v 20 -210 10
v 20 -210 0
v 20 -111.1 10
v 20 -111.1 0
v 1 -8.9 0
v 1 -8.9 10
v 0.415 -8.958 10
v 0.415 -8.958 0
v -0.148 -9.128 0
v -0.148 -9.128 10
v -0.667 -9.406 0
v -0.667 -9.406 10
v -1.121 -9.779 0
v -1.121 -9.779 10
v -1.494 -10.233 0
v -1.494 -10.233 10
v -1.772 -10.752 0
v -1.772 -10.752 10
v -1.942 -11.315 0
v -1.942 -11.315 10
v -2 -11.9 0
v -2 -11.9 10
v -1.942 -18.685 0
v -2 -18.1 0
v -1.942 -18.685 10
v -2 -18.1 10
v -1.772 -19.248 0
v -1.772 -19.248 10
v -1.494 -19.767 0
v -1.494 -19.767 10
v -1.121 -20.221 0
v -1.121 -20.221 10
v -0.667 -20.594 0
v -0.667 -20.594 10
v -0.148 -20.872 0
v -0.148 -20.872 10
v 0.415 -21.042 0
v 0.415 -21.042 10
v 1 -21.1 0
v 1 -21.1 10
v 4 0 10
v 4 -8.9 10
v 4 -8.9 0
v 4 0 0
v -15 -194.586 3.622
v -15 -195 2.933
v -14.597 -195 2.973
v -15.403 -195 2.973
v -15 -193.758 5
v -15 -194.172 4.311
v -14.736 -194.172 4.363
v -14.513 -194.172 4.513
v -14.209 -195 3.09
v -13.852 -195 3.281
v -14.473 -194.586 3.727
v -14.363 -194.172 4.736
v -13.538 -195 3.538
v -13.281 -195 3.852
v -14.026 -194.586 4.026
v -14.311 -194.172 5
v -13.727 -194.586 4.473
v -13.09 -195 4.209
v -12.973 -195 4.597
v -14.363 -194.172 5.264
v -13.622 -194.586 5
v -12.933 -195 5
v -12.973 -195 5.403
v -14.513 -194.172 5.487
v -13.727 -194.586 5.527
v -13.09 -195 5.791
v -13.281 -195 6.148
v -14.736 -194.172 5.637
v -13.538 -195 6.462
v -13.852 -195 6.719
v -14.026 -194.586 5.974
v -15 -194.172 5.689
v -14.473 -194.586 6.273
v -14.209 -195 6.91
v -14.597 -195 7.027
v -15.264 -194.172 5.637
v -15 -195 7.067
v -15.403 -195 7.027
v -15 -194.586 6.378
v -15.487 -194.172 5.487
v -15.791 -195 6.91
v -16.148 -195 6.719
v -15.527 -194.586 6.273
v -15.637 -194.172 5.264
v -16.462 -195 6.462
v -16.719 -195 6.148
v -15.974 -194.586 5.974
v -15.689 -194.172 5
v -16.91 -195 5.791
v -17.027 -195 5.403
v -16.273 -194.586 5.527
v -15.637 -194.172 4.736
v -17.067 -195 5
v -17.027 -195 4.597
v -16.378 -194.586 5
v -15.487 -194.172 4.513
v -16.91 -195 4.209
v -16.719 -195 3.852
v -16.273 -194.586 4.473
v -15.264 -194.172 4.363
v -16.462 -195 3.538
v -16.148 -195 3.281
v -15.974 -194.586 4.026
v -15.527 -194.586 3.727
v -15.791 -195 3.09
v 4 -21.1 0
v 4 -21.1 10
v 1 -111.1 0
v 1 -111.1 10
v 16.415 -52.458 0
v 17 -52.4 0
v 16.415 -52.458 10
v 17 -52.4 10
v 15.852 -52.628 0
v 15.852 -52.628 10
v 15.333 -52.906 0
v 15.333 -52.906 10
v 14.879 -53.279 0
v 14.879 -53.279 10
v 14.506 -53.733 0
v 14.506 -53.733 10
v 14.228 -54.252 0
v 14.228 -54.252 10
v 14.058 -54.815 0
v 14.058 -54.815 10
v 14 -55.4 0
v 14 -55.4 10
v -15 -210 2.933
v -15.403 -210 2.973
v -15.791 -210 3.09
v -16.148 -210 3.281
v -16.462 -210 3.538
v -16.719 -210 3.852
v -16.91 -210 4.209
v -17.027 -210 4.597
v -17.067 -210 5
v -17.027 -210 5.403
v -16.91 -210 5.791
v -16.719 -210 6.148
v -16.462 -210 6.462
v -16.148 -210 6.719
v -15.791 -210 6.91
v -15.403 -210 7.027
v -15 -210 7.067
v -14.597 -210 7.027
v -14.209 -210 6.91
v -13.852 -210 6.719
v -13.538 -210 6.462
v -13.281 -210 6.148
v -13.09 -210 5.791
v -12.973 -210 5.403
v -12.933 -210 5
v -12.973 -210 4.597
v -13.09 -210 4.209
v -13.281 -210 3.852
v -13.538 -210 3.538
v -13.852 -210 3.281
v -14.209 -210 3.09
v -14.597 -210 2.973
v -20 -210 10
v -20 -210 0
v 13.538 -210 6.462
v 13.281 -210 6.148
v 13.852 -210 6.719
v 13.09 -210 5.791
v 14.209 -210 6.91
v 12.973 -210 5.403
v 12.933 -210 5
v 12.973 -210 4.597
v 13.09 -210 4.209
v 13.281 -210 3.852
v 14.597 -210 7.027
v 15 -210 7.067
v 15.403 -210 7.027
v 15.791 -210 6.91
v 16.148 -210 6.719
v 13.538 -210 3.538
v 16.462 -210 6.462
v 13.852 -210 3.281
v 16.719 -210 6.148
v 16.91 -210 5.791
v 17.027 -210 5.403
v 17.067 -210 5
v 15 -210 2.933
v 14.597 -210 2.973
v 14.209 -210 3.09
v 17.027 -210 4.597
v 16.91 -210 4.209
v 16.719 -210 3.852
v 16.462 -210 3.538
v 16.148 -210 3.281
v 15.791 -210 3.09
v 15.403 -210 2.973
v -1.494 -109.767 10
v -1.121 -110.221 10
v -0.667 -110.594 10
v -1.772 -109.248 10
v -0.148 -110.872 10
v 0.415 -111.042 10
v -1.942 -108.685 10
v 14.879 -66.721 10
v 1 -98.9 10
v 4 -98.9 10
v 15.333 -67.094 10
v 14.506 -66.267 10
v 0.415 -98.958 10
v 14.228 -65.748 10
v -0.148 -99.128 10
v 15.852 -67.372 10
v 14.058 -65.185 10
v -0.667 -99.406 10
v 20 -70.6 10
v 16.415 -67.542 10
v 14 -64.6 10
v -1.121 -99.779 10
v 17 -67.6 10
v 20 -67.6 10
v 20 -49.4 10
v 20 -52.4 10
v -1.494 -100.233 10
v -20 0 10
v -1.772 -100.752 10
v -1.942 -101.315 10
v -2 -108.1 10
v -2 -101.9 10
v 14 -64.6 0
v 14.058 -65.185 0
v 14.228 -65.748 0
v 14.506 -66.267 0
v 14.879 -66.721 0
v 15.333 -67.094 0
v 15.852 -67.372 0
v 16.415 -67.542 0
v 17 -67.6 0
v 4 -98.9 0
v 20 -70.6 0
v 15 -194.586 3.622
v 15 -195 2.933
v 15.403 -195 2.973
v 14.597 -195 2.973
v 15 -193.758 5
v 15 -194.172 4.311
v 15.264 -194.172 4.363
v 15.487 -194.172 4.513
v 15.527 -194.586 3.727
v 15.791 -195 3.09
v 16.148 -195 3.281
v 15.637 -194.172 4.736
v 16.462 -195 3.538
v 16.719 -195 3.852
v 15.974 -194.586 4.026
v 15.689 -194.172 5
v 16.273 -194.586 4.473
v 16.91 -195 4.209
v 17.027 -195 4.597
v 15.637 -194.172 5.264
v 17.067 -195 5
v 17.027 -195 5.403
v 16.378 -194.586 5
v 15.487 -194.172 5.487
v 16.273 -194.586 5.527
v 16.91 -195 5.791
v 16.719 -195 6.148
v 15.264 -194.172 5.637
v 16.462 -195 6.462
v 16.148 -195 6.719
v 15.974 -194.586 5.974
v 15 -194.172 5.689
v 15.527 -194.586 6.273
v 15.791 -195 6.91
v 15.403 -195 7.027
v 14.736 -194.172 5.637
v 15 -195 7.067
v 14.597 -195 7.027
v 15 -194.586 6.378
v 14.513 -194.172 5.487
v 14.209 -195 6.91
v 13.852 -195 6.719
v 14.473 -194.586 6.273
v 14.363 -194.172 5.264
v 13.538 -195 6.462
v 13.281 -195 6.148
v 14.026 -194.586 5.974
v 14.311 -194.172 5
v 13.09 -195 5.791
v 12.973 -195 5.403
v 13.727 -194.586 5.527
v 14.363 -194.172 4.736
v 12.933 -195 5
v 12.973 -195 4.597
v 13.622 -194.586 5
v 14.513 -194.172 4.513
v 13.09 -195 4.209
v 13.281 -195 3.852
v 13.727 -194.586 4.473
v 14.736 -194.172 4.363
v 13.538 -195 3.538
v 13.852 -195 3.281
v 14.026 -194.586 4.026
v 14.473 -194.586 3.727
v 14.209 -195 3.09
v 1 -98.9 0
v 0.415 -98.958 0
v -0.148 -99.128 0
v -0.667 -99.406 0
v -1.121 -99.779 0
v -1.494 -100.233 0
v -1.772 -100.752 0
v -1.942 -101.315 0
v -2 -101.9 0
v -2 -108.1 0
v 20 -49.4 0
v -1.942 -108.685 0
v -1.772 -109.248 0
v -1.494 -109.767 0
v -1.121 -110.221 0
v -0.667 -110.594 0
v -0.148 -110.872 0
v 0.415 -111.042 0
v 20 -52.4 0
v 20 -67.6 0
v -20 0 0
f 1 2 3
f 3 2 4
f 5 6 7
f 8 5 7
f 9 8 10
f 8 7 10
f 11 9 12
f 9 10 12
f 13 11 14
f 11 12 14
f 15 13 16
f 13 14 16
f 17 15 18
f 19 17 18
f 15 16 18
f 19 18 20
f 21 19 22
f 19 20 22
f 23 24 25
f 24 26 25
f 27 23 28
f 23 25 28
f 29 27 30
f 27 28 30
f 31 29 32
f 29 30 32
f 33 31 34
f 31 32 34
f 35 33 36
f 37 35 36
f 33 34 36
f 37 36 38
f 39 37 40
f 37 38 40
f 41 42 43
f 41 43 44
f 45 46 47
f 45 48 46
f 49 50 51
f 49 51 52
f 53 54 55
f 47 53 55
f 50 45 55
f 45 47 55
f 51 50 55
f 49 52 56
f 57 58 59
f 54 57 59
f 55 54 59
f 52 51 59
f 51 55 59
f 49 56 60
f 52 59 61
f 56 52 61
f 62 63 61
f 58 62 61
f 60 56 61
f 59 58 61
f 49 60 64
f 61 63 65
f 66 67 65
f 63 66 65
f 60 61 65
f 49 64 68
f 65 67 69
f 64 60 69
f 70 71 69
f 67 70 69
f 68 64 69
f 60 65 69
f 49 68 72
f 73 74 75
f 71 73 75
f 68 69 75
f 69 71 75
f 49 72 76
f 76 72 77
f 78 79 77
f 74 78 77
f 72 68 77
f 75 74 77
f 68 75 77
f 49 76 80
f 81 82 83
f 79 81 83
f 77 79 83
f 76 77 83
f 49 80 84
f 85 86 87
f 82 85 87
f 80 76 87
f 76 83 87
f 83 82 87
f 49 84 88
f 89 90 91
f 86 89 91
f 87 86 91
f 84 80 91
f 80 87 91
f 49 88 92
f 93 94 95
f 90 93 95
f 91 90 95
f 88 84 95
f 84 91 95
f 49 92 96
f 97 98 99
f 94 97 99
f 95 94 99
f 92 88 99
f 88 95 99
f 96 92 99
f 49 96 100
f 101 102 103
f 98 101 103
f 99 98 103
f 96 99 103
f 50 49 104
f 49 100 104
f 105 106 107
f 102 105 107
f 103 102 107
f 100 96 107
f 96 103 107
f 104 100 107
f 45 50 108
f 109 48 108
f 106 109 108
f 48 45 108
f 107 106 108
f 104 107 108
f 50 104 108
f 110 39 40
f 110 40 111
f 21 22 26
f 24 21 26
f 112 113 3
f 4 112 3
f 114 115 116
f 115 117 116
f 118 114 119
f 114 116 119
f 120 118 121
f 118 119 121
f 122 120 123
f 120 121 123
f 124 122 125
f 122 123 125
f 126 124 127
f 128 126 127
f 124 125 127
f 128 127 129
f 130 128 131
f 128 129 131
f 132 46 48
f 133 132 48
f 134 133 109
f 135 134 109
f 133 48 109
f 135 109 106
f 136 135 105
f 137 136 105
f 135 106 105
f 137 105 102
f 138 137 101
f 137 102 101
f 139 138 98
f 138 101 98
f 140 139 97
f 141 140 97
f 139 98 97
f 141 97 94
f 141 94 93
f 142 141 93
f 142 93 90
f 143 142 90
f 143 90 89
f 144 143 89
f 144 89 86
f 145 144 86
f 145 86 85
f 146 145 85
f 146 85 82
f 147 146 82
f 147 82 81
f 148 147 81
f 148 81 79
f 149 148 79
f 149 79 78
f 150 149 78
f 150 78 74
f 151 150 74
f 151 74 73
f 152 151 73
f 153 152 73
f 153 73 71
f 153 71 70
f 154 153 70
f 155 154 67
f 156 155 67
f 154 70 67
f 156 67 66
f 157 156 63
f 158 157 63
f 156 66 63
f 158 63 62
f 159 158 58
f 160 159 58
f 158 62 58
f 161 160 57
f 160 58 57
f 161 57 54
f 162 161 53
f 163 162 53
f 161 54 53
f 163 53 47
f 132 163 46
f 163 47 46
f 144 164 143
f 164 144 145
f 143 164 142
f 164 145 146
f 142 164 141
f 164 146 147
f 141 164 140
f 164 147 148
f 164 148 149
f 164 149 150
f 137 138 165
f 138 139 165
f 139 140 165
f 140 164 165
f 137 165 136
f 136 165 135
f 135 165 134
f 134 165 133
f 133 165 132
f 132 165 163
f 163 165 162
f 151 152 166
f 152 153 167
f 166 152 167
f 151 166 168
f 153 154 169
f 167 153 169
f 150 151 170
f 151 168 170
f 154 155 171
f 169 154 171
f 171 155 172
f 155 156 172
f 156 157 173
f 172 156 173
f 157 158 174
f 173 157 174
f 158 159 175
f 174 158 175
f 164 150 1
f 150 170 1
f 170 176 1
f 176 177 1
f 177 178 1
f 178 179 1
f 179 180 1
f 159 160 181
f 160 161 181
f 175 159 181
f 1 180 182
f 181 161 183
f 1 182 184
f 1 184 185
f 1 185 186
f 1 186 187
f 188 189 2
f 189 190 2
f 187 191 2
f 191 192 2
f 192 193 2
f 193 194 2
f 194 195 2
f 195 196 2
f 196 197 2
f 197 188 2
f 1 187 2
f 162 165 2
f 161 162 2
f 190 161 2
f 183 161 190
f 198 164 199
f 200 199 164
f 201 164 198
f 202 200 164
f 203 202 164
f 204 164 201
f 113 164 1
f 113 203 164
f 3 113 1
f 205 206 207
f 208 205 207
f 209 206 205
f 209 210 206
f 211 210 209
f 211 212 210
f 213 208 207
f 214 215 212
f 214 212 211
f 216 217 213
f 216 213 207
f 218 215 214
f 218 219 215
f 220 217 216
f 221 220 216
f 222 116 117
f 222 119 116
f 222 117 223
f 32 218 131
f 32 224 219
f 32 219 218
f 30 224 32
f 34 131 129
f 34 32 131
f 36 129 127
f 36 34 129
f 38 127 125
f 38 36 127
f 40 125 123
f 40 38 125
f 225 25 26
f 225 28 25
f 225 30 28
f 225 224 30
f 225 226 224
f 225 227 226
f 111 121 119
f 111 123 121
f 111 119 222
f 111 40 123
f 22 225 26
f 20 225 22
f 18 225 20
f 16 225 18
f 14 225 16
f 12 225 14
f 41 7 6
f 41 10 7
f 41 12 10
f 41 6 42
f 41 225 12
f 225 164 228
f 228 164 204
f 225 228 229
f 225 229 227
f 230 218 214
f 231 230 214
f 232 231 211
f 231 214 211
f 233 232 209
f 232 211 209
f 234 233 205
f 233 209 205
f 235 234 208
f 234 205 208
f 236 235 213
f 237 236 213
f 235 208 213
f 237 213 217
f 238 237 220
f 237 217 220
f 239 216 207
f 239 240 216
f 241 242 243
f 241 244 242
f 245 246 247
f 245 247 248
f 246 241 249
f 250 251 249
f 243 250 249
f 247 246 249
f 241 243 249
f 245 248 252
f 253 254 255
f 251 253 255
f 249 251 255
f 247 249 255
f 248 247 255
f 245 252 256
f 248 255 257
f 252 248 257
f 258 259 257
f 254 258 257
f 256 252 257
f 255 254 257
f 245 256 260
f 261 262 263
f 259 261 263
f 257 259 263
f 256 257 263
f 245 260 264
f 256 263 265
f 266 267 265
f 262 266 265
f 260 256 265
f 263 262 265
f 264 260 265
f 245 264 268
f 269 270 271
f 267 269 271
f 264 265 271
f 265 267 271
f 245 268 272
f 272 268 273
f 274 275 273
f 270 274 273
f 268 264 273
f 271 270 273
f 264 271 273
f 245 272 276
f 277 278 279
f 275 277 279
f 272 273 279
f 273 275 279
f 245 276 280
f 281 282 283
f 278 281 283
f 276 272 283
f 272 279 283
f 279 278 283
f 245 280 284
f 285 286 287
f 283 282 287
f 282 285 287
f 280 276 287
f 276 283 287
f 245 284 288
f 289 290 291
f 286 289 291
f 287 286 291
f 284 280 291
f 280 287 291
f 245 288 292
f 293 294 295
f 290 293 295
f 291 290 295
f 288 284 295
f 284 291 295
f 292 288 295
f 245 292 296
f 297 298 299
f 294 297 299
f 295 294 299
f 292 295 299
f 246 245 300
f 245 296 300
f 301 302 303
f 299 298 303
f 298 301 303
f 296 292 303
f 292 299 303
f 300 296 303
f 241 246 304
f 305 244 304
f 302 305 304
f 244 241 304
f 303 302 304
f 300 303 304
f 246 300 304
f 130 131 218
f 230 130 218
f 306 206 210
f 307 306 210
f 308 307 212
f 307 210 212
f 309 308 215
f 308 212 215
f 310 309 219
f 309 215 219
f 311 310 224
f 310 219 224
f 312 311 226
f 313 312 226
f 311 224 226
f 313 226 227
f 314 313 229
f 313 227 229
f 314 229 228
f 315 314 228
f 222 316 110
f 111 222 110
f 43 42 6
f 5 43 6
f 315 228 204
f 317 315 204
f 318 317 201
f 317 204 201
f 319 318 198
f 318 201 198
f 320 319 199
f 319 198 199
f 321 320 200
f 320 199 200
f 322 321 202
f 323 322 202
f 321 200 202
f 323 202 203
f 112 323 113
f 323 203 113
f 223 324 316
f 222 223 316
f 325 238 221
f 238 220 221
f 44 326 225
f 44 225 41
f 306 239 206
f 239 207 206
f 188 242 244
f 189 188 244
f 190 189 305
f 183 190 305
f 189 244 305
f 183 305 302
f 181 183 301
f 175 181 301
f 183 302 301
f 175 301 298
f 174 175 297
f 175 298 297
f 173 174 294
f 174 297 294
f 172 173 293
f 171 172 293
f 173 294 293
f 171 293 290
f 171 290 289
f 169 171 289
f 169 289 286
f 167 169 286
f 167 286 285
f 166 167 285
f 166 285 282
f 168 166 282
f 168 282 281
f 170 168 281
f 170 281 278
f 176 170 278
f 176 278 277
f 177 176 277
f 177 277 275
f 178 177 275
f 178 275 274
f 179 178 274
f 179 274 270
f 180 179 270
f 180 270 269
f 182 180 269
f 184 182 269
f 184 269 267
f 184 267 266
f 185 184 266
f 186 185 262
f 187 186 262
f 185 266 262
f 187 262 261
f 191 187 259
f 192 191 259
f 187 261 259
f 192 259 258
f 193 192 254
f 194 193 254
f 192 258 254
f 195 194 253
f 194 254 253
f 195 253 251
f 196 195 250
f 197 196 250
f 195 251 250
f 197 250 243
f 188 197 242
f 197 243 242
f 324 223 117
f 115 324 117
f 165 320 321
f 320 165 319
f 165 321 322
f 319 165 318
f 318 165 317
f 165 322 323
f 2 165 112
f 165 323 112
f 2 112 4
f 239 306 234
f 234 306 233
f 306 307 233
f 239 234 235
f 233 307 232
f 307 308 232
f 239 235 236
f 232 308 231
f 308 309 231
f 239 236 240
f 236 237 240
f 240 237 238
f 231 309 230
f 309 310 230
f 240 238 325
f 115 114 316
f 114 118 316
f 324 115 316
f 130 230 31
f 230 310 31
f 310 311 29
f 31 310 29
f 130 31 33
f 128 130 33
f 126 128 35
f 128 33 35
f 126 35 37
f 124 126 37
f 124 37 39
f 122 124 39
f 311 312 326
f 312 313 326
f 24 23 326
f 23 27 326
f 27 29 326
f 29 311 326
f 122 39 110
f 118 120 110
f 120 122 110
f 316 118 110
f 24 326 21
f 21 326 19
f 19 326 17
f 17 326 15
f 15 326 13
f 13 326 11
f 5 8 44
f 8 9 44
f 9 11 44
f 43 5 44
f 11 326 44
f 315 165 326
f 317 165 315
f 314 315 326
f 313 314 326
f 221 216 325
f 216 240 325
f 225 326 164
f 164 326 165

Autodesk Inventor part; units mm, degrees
ref_plane "YZ Plane" through (0, 0, 0) normal (1, 0, 0) x (0, 1, 0)
ref_plane "XZ Plane" through (0, 0, 0) normal (0, 1, 0) x (-1, 0, 0)
ref_plane "XY Plane" through (0, 0, 0) normal (0, 0, 1) x (1, 0, 0)
sketch "Skizze1" plane through (0, 0, 0) normal (0, 0, 1) x (1, 0, 0)
  line L0 (0, 42) -> (0, -252) projected
  line L1 (-28, 0) -> (28, 0) projected
  line L2 (20, 0) -> (-20, 0)
  line L3 (-20, 0) -> (-20, -210)
  line L4 (-20, -210) -> (20, -210)
  line L5 (20, -210) -> (20, 0)
  point P0 (0, 0)
  point P1 (0, -210)
  dimension "d0" = 210
  dimension "d1" = 40
extrude "Extrusion1" add sketch "Skizze1" along normal blind 10
sketch "Skizze2" plane through (0, 0, 10) normal (0, 0, 1) x (1, 0, 0)
  line L0 (20, 0) -> (20, -210) projected
  line L1 (-20, 0) -> (20, 0) projected
  line L2 (20, -8.9) -> (1, -8.9)
  line L3 (-2, -11.9) -> (-2, -18.1)
  line L4 (1, -21.1) -> (20, -21.1)
  line L5 (20, -21.1) -> (20, -8.9)
  arc A0 (1, -8.9) -> (-2, -11.9) centre (1, -11.9) ccw
  arc A1 (-2, -18.1) -> (1, -21.1) centre (1, -18.1) ccw
  line L6 (1, -12) -> (1, -18) construction
  line L7 (20, -52.4) -> (17, -52.4)
  line L8 (14, -55.4) -> (14, -64.6)
  line L9 (17, -67.6) -> (20, -67.6)
  line L10 (20, -67.6) -> (20, -52.4)
  arc A2 (17, -52.4) -> (14, -55.4) centre (17, -55.4) ccw
  arc A3 (14, -64.6) -> (17, -67.6) centre (17, -64.6) ccw
  line L11 (17, -55.5) -> (17, -64.5) construction
  line L12 (20, -98.9) -> (1, -98.9)
  line L13 (-2, -101.9) -> (-2, -108.1)
  line L14 (1, -111.1) -> (20, -111.1)
  line L15 (20, -111.1) -> (20, -98.9)
  arc A4 (1, -98.9) -> (-2, -101.9) centre (1, -101.9) ccw
  arc A5 (-2, -108.1) -> (1, -111.1) centre (1, -108.1) ccw
  line L16 (1, -102) -> (1, -108) construction
  point P0 (0, 0)
  dimension "d4" = 22
  dimension "d5" = 12.2
  dimension "d6" = 3
  dimension "d7" = 6
  dimension "d8" = 0.1
  dimension "d9" = 12
  dimension "d10" = 6
  dimension "d11" = 15.2
  dimension "d12" = 3
  dimension "d13" = 9
  dimension "d14" = 0.1
  dimension "d15" = 55.5
  dimension "d16" = 12.2
  dimension "d17" = 22
  dimension "d18" = 3
  dimension "d19" = 6
  dimension "d20" = 0.1
  dimension "d21" = 102
extrude "Extrusion2" cut sketch "Skizze2" against normal through all
sketch "Skizze3" plane through (0, 0, 0) normal (0, 0, -1) x (-1, 0, 0)
  line L0 (-20, -98.9) -> (-1, -98.9) projected
  line L1 (-20, 0) -> (20, 0) projected
  line L2 (-20, -8.9) -> (-20, 0) projected
  line L3 (-20, -8.9) -> (-1, -8.9) projected
  line L4 (-1, -21.1) -> (-20, -21.1) projected
  line L5 (-20, -52.4) -> (-20, -21.1) projected
  line L6 (-20, -52.4) -> (-17, -52.4) projected
  line L7 (-17, -67.6) -> (-20, -67.6) projected
  line L8 (-20, -98.9) -> (-20, -67.6) projected
  line L9 (-20, -49.4) -> (-4, -21.1)
  line L10 (-4, -8.9) -> (-4, 0)
  line L11 (-20, -70.6) -> (-4, -98.9)
  point P0 (0, 0)
  dimension "d24" = 3
  dimension "d25" = 3
  dimension "d26" = 16
  dimension "d27" = 3
  dimension "d28" = 3
extrude "Extrusion3" cut sketch "Skizze3" against normal through all
sketch "Skizze4" plane through (-20, -210, 0) normal (0, -1, 0) x (1, 0, 0)
  line L0 (0, 0) -> (40, 0) projected
  line L1 (40, 0) -> (40, 10) projected
  point P0 (20, 0)
  point P1 (5, 5)
  point P2 (35, 5)
  dimension "d31" = 30
  dimension "d32" = 5
  dimension "d33" = 5
  dimension "d34" = 5
hole "Bohrung1" at (-15, -210, 5) at (15, -210, 5) direction (0, 1, 0) diameter 4.134 depth 15 tip angle 118 thread size "M5x0.8" class "6H" standard "ISO Metric profile"
equation "\"d16\" = d5"
equation "\"d17\" = d4"
equation "\"d18\" = d6"
equation "\"d27\" = d25"
equation "\"d28\" = d24"
equation "\"d34\" = d33"
properties part number "Olfactometer_Holder" material "Stainless Steel"
